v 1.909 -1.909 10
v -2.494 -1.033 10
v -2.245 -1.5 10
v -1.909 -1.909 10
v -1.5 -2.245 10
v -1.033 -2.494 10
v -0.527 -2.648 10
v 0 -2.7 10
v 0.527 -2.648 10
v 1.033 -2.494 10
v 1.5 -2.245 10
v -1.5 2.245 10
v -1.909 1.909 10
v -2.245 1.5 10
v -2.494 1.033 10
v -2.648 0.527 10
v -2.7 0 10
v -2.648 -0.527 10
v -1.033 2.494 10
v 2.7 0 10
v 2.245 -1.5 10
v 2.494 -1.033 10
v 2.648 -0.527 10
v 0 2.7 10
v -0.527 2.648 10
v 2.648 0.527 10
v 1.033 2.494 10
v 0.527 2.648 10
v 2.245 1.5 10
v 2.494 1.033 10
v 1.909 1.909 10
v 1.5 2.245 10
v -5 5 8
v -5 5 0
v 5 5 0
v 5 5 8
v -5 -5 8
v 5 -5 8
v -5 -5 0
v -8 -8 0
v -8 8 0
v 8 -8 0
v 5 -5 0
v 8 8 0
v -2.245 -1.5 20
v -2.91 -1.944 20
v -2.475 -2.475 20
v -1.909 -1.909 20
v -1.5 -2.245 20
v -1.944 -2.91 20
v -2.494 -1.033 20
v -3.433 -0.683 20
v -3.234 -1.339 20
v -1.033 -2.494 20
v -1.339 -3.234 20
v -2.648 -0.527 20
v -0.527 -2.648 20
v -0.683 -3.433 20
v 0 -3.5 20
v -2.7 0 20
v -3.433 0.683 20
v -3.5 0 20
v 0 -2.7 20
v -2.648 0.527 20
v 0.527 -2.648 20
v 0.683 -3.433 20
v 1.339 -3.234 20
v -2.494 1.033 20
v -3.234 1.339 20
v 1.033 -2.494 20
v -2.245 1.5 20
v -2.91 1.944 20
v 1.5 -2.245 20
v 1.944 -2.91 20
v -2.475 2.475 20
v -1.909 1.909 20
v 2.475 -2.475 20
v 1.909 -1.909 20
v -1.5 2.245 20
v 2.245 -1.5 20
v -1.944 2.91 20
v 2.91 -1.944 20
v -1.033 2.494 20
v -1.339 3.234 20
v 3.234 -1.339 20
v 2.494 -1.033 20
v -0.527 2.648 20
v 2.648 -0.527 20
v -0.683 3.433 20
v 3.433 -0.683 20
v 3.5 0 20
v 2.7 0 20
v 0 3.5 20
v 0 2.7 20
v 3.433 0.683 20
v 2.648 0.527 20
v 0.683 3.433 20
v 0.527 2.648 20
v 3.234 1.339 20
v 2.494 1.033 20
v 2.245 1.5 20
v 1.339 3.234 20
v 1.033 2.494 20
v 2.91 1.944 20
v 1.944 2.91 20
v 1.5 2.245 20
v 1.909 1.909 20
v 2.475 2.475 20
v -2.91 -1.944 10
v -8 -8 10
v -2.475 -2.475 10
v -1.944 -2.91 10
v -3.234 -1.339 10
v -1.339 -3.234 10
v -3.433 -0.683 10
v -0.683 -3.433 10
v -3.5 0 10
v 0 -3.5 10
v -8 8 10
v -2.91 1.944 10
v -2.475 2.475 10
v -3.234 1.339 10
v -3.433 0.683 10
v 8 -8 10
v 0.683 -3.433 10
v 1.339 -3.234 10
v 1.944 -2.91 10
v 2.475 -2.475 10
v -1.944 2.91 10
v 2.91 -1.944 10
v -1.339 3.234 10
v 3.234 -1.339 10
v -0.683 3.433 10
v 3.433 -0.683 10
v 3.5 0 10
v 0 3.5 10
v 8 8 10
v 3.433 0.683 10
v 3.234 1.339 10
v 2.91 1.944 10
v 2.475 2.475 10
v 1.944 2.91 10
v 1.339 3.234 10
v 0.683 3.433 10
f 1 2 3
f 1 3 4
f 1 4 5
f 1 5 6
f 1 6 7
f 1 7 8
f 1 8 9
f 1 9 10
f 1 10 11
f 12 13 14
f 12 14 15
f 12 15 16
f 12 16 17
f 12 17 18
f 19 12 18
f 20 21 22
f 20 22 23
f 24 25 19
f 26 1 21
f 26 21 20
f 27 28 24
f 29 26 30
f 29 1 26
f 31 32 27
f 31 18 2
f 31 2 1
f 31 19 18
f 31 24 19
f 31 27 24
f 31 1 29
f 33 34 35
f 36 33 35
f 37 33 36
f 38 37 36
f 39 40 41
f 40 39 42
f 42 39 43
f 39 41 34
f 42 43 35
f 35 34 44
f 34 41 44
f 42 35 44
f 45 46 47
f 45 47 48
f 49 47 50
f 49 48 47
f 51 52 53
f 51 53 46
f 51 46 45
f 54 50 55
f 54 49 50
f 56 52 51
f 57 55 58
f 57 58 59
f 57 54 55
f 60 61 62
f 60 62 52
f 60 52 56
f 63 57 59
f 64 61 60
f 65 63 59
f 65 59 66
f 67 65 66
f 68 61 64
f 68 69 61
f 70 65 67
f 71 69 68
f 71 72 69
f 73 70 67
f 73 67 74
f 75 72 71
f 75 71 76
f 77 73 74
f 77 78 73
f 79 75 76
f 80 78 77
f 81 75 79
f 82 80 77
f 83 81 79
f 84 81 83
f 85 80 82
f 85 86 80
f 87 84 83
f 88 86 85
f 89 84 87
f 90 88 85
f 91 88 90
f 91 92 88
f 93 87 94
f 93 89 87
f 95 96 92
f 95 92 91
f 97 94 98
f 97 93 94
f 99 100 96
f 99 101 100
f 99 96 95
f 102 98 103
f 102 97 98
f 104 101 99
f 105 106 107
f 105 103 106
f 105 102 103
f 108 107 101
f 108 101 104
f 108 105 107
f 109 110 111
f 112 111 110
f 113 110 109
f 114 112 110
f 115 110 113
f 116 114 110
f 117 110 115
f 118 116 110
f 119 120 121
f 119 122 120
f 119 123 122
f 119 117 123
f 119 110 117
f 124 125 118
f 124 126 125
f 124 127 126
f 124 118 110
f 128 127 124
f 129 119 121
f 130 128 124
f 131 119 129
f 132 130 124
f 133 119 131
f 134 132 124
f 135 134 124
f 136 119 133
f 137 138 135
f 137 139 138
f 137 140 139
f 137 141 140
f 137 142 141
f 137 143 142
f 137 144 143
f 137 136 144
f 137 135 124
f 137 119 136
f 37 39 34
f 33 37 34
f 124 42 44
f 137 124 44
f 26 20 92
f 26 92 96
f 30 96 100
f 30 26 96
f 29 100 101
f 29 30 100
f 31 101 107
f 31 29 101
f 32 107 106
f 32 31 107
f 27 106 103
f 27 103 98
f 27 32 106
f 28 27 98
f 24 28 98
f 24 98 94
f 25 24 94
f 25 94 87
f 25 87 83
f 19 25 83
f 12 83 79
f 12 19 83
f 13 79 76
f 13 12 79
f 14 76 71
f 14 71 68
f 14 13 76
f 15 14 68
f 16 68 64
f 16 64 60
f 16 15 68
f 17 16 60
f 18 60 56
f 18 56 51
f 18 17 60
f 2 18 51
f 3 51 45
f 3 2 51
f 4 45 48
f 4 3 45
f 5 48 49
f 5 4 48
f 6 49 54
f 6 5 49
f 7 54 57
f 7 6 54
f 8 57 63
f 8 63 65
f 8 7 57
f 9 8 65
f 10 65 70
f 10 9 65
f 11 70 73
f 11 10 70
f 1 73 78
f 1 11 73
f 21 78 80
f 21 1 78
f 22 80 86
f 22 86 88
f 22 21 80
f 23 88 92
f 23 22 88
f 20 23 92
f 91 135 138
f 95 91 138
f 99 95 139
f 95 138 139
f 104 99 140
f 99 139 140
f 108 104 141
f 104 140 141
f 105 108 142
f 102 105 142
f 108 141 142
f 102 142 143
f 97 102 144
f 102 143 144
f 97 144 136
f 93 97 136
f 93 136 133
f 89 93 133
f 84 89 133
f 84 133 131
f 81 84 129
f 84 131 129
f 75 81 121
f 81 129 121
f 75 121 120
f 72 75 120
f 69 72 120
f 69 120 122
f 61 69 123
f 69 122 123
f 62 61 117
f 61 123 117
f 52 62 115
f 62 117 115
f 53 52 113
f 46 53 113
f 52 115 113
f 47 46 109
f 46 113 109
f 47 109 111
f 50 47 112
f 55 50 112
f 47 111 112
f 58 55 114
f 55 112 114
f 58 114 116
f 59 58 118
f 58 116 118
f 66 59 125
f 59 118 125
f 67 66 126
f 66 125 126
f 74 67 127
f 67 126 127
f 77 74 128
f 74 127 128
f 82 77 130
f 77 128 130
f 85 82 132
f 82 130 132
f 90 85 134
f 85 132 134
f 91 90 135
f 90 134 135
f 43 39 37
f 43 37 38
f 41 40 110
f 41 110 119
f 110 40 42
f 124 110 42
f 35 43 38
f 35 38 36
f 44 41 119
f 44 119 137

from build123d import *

# Parameters (mm, degrees)
BOX001_W          = 10
BOX001_H          = 10
BOX001_DEPTH      = 8
CYLINDER_R        = 2.7
CYLINDER_DEPTH    = 10
CYLINDER001_R     = 3.5
CYLINDER001_DEPTH = 10
BOX_W             = 16
BOX_H             = 16
BOX_DEPTH         = 10


with BuildPart() as cube001:
    # Box001 → Box001 (new body)
    with BuildSketch(Plane(origin=(-5, -5, 0), x_dir=(1, 0, 0), z_dir=(0, 0, 1))):
        with Locations((5, 5)):
            Rectangle(BOX001_W, BOX001_H)
    extrude(amount=BOX001_DEPTH)


with BuildPart() as cylinder:
    # Cylinder → Cylinder (new body)
    with BuildSketch(Plane.XY.offset(10)):
        Circle(CYLINDER_R)
    extrude(amount=CYLINDER_DEPTH)


with BuildPart() as cut:
    # Cylinder001 → Cylinder001 (new body)
    with BuildSketch(Plane.XY.offset(10)):
        Circle(CYLINDER001_R)
    extrude(amount=CYLINDER001_DEPTH)

    # Cut: cut Cylinder
    add(cylinder.part, mode=Mode.SUBTRACT)


with BuildPart() as cut001:
    # Box → Box (new body)
    with BuildSketch(Plane(origin=(-8, -8, 0), x_dir=(1, 0, 0), z_dir=(0, 0, 1))):
        with Locations((8, 8)):
            Rectangle(BOX_W, BOX_H)
    extrude(amount=BOX_DEPTH)

    # Fusion: union Cut
    add(cut.part)

    # Cut001: cut Cube001
    add(cube001.part, mode=Mode.SUBTRACT)


solid = cut001.part
